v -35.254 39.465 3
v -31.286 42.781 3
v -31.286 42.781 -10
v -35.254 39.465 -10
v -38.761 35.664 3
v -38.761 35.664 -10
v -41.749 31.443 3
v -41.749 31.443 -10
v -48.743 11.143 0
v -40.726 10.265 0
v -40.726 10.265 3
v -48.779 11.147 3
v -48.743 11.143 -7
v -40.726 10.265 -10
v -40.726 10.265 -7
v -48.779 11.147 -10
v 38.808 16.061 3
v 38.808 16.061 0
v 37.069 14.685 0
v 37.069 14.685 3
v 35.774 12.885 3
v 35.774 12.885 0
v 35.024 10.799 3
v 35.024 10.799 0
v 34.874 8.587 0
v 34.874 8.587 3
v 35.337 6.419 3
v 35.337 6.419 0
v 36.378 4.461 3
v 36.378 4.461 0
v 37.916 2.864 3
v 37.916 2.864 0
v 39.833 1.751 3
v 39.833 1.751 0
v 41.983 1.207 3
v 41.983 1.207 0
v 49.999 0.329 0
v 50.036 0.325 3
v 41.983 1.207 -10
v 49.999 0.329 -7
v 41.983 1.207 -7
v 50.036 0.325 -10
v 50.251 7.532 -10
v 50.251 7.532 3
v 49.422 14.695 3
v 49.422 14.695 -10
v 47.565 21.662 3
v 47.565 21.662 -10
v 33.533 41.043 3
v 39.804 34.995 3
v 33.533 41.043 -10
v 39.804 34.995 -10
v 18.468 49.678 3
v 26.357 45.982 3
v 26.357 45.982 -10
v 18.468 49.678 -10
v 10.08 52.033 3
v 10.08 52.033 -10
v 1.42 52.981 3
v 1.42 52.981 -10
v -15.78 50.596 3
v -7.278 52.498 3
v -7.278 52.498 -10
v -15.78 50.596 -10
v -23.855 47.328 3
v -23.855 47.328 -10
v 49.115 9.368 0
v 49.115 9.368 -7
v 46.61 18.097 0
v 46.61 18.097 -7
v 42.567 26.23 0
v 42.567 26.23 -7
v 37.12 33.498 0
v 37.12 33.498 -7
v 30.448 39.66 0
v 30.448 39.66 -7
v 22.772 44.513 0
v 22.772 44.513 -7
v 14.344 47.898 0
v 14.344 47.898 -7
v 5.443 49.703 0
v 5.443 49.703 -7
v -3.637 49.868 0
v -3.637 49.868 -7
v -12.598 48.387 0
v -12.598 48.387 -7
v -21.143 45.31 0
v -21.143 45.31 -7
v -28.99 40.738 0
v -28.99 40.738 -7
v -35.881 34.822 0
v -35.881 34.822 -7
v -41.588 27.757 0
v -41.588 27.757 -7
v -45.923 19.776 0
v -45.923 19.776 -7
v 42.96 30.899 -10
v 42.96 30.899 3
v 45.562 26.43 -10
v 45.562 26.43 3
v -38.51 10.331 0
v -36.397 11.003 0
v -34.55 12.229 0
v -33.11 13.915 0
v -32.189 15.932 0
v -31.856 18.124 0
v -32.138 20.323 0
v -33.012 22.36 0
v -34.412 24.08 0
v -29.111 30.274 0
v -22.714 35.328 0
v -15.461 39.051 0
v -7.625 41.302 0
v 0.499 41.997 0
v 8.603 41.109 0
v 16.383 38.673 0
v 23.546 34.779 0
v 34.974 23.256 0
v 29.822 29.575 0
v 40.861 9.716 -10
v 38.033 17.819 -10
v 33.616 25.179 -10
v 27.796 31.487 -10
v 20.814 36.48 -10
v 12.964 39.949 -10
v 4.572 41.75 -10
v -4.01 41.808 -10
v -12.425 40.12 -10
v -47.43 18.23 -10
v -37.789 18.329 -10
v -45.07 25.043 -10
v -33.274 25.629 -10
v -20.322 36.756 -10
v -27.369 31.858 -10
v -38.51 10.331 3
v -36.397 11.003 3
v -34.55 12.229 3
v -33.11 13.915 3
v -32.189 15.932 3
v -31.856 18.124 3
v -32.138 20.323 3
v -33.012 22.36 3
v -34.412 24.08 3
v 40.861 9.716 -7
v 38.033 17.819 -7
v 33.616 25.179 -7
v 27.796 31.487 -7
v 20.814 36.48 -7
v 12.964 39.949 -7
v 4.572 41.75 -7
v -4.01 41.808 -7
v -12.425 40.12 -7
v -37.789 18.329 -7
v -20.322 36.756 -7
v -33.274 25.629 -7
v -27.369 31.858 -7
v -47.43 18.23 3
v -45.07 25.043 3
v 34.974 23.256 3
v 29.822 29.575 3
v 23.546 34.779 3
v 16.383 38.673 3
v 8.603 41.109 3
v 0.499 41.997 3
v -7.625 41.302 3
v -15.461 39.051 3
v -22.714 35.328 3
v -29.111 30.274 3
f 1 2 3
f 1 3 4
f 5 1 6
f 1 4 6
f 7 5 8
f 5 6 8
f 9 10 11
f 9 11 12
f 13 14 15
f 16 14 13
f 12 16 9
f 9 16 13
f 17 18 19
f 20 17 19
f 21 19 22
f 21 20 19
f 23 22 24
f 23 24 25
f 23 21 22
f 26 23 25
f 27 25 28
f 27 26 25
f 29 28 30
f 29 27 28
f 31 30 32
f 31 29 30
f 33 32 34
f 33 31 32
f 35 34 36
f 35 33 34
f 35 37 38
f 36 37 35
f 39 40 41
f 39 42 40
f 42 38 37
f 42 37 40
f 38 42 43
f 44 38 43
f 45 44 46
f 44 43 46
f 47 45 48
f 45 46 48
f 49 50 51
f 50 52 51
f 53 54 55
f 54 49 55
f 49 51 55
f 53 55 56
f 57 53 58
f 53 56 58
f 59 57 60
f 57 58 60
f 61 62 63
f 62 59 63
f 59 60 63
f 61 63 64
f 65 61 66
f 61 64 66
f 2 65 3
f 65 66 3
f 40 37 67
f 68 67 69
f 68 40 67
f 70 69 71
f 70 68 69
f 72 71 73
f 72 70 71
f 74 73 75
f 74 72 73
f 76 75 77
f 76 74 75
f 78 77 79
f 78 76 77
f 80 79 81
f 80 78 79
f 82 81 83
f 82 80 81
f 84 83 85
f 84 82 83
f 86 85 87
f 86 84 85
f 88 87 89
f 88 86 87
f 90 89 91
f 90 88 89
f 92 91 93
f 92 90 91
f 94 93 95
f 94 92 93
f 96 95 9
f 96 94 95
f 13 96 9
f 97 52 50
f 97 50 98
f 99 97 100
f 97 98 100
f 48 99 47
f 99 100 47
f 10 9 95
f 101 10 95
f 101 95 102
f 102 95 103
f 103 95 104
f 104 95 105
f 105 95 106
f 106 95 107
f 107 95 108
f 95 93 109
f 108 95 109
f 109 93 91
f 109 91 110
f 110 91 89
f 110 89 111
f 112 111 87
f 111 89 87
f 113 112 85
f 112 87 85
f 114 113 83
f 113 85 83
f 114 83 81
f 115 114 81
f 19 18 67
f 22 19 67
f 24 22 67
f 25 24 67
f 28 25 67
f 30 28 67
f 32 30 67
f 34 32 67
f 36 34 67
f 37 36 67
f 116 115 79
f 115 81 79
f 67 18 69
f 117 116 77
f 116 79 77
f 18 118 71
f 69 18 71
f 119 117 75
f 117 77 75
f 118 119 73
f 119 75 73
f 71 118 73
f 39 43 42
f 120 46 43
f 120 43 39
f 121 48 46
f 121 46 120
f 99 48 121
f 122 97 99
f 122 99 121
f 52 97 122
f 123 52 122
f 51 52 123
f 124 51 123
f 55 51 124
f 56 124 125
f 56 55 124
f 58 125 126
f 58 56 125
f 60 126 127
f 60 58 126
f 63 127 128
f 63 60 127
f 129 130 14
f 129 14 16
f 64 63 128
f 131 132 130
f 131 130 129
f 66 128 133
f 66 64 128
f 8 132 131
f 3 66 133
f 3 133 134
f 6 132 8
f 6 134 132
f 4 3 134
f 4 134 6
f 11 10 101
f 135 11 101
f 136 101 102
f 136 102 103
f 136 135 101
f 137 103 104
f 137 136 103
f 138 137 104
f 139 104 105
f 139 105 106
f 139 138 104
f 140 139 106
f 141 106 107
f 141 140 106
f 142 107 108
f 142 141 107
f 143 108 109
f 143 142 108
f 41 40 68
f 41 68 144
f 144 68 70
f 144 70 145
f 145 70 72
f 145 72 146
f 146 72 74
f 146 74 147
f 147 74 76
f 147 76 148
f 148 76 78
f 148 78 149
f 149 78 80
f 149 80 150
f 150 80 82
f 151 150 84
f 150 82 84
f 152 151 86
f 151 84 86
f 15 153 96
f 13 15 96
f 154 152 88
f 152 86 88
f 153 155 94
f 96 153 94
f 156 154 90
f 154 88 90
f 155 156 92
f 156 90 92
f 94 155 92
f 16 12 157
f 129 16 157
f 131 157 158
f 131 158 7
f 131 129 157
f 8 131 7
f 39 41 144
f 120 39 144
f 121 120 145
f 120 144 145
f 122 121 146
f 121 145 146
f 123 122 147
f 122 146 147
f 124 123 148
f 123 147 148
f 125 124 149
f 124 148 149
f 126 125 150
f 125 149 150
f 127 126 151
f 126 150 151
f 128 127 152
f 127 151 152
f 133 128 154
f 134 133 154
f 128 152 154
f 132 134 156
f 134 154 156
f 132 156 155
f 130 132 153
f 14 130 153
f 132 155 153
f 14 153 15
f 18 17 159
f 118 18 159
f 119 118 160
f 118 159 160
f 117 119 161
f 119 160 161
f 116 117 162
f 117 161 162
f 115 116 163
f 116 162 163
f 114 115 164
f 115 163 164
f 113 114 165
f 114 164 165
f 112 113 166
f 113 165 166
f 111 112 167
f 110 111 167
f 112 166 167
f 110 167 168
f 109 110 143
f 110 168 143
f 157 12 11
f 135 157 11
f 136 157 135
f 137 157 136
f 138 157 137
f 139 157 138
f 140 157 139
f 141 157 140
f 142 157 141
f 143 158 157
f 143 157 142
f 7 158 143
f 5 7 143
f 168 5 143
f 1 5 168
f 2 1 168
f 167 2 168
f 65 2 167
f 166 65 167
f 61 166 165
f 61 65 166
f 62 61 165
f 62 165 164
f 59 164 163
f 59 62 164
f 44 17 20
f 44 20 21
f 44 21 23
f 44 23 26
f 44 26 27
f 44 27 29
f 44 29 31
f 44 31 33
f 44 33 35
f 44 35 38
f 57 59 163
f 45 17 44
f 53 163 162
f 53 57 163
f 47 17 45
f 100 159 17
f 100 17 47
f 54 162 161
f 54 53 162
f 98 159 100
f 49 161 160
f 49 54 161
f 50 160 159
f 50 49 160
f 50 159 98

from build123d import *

# Parameters (mm, degrees)
SKETCH1_W                     = 50
SKETCH1_H                     = 7
REVOLVE5_ANGLE                = 167.5
SHELL2_T                      = 3
CUT_EXTRUDE3_DEPTH            = 77.072333999
CUT_EXTRUDE3_DEPTH_BACK       = 10
CUT_EXTRUDE4_DEPTH            = 77.072333999
CUT_EXTRUDE4_DEPTH_BACK       = 10
CUT_EXTRUDE_THIN1_DEPTH       = 77.072333999
CUT_EXTRUDE_THIN1_DEPTH_BACK  = 20
CUT_EXTRUDE_THIN2_DEPTH       = 77.072333999
CUT_EXTRUDE_THIN2_DEPTH_BACK  = 20
CUT_EXTRUDE_THIN3_DEPTH       = 76.000787866
CUT_EXTRUDE_THIN3_DEPTH_BACK  = 20
SKETCH18_R                    = 8
BOSS_EXTRUDE3_DEPTH           = 3
CUT_EXTRUDE_THIN11_DEPTH      = 76.000787866
CUT_EXTRUDE_THIN11_DEPTH_BACK = 20
CUT_EXTRUDE_THIN12_DEPTH      = 76.000787866
CUT_EXTRUDE_THIN12_DEPTH_BACK = 20
FILLET2_R                     = 40


with BuildPart() as part:
    # Sketch1 → Revolve5 (revolve)
    with BuildSketch(Plane(origin=(0, 0, 0), x_dir=(1, 0, 0), z_dir=(0, 1, 0))):
        with Locations((25, 3.5)):
            Rectangle(SKETCH1_W, SKETCH1_H)
    revolve(axis=Axis((0, 0, 0), (0, 0, 1)), revolution_arc=REVOLVE5_ANGLE)

    # Shell2
    shell2_openings = [part.faces().sort_by_distance(p)[0] for p in [
        (25, 0, -3.5),
        (-24.407400178, 5.410990348, -3.5),
    ]]
    offset(amount=SHELL2_T, openings=shell2_openings, kind=Kind.INTERSECTION)

    # Sketch11 → Cut-Extrude3 (cut, two sides: drawn at the far end of the back side and taken through both)
    with BuildSketch(Plane.XY.offset(3).offset(-CUT_EXTRUDE3_DEPTH_BACK)):
        Polygon((-295.067343662, 38.119573796), (-51.743688377, 11.471299539), (53, 0), (296.323655284, -26.648274258), (243.027106769, -513.295584826), (-348.363892177, -448.527736772), align=None)
    extrude(amount=CUT_EXTRUDE3_DEPTH + CUT_EXTRUDE3_DEPTH_BACK, mode=Mode.SUBTRACT)

    # Sketch12 → Cut-Extrude4 (cut, two sides: drawn at the far end of the back side and taken through both)
    with BuildSketch(Plane(origin=(0, 0, -10), x_dir=(-1, 0, 0), z_dir=(0, 0, -1)).offset(-CUT_EXTRUDE4_DEPTH_BACK)):
        Polygon((-296.323655284, -26.648274258), (-53, 0), (51.743688377, 11.471299539), (295.067343662, 38.119573796), (348.363892177, -448.527736772), (-243.027106769, -513.295584826), align=None)
    extrude(amount=CUT_EXTRUDE4_DEPTH + CUT_EXTRUDE4_DEPTH_BACK, mode=Mode.SUBTRACT)

    # Sketch13 → Cut-Extrude-Thin1 (cut, two sides: drawn at the far end of the back side and taken through both)
    with BuildSketch(Plane(origin=(0, 0, -10), x_dir=(-1, 0, 0), z_dir=(0, 0, -1)).offset(-CUT_EXTRUDE_THIN1_DEPTH_BACK)):
        Polygon((48.779244367, 11.146640118), (47.419699991, 23.560551191), (57.360263374, 24.64921994), (58.719807749, 12.235308866), align=None)
    extrude(amount=CUT_EXTRUDE_THIN1_DEPTH + CUT_EXTRUDE_THIN1_DEPTH_BACK, mode=Mode.SUBTRACT)

    # Sketch14 → Cut-Extrude-Thin2 (cut, two sides: drawn at the far end of the back side and taken through both)
    with BuildSketch(Plane(origin=(0, 0, -10), x_dir=(-1, 0, 0), z_dir=(0, 0, -1)).offset(-CUT_EXTRUDE_THIN2_DEPTH_BACK)):
        Polygon((-50.035555989, 0.324659421), (-51.39409796, 12.729417605), (-81.215788107, 9.46341136), (-79.857246136, -2.941346825), align=None)
    extrude(amount=CUT_EXTRUDE_THIN2_DEPTH + CUT_EXTRUDE_THIN2_DEPTH_BACK, mode=Mode.SUBTRACT)

    # Sketch15 → Cut-Extrude-Thin3 (cut, two sides: drawn at the far end of the back side and taken through both)
    with BuildSketch(Plane(origin=(0, 0, -10), x_dir=(-1, 0, 0), z_dir=(0, 0, -1)).offset(-CUT_EXTRUDE_THIN3_DEPTH_BACK)):
        with BuildLine():
            ThreePointArc((-41.982664634, 1.20659446), (-4.572408744, 41.750366205), (40.726353012, 10.264705079))
            Line((40.726353012, 10.264705079), (11.636100861, 2.93277288))
            ThreePointArc((11.636100861, 2.93277288), (-1.306402498, 11.928676059), (-11.995047038, 0.344741274))
            Line((-11.995047038, 0.344741274), (-41.982664634, 1.20659446))
        make_face()
    extrude(amount=CUT_EXTRUDE_THIN3_DEPTH + CUT_EXTRUDE_THIN3_DEPTH_BACK, mode=Mode.SUBTRACT)


with BuildPart() as body_2:
    # of the pieces the cut leaves, the one that is kept (cut_extrude_thin3_keep)
    add(part.part.solids().sort_by_distance((49.998919737, 0.328671743, 0))[0])

    # Sketch18 → Boss-Extrude3 (add)
    with BuildSketch(Plane.XY.offset(3)):
        with Locations((-39.855418013, 18.217155785)):
            Circle(SKETCH18_R)
        with Locations((42.853599633, 9.159045166)):
            Circle(SKETCH18_R)
    extrude(amount=-BOSS_EXTRUDE3_DEPTH)

    # Sketch26 → Cut-Extrude-Thin11 (cut, two sides: drawn at the far end of the back side and taken through both)
    with BuildSketch(Plane.XY.offset(3).offset(-CUT_EXTRUDE_THIN11_DEPTH_BACK)):
        with BuildLine():
            ThreePointArc((-48.779244367, 11.146640118), (-44.869380897, 25.502903795), (-36.885486711, 38.058650397))
            Line((-36.885486711, 38.058650397), (-51.966031339, 51.195513559))
            ThreePointArc((-51.966031339, 51.195513559), (-63.162508763, 33.587548061), (-68.645634797, 13.454568038))
            Line((-68.645634797, 13.454568038), (-48.779244367, 11.146640118))
        make_face()
    extrude(amount=CUT_EXTRUDE_THIN11_DEPTH + CUT_EXTRUDE_THIN11_DEPTH_BACK, mode=Mode.SUBTRACT)

    # Sketch27 → Cut-Extrude-Thin12 (cut, two sides: drawn at the far end of the back side and taken through both)
    with BuildSketch(Plane.XY.offset(3).offset(-CUT_EXTRUDE_THIN12_DEPTH_BACK)):
        with BuildLine():
            ThreePointArc((50.035555989, 0.324659421), (49.325636064, 15.186871666), (44.248552996, 29.173027916))
            Line((44.248552996, 29.173027916), (61.814966092, 38.73446771))
            ThreePointArc((61.814966092, 38.73446771), (68.93498104, 19.120520049), (69.93056067, -1.721993641))
            Line((69.93056067, -1.721993641), (50.035555989, 0.324659421))
        make_face()
    extrude(amount=CUT_EXTRUDE_THIN12_DEPTH + CUT_EXTRUDE_THIN12_DEPTH_BACK, mode=Mode.SUBTRACT)

    # Fillet2
    # the kernel refuses this fillet: 40 mm, written as the material it takes off along each edge
    with BuildSketch(Plane(origin=(-36.885486711, 38.058650397, -30.526100609), x_dir=(-0.5923211564074143, -0.8057019595807023, 0), z_dir=(0, 0, 1)), Plane(origin=(44.248552996, 29.173027916, 23.526100609), x_dir=(0.4038949588524026, -0.9148053684875357, 0), z_dir=(0, 0, -1))) as fillet2_piece_1:
        with BuildLine():
            CenterArc((4.906698725, 39.863332675), FILLET2_R, 252.499995648, 22.237662415)
            ThreePointArc((-7.121536153, 1.714655559), (-3.59042601, 0.734148493), (0, 0))
            ThreePointArc((0, 0), (4.105220122, -0.169822442), (8.210440244, 0))
        make_face()
    extrude(amount=54.052201219, mode=Mode.SUBTRACT)


solid = body_2.part
